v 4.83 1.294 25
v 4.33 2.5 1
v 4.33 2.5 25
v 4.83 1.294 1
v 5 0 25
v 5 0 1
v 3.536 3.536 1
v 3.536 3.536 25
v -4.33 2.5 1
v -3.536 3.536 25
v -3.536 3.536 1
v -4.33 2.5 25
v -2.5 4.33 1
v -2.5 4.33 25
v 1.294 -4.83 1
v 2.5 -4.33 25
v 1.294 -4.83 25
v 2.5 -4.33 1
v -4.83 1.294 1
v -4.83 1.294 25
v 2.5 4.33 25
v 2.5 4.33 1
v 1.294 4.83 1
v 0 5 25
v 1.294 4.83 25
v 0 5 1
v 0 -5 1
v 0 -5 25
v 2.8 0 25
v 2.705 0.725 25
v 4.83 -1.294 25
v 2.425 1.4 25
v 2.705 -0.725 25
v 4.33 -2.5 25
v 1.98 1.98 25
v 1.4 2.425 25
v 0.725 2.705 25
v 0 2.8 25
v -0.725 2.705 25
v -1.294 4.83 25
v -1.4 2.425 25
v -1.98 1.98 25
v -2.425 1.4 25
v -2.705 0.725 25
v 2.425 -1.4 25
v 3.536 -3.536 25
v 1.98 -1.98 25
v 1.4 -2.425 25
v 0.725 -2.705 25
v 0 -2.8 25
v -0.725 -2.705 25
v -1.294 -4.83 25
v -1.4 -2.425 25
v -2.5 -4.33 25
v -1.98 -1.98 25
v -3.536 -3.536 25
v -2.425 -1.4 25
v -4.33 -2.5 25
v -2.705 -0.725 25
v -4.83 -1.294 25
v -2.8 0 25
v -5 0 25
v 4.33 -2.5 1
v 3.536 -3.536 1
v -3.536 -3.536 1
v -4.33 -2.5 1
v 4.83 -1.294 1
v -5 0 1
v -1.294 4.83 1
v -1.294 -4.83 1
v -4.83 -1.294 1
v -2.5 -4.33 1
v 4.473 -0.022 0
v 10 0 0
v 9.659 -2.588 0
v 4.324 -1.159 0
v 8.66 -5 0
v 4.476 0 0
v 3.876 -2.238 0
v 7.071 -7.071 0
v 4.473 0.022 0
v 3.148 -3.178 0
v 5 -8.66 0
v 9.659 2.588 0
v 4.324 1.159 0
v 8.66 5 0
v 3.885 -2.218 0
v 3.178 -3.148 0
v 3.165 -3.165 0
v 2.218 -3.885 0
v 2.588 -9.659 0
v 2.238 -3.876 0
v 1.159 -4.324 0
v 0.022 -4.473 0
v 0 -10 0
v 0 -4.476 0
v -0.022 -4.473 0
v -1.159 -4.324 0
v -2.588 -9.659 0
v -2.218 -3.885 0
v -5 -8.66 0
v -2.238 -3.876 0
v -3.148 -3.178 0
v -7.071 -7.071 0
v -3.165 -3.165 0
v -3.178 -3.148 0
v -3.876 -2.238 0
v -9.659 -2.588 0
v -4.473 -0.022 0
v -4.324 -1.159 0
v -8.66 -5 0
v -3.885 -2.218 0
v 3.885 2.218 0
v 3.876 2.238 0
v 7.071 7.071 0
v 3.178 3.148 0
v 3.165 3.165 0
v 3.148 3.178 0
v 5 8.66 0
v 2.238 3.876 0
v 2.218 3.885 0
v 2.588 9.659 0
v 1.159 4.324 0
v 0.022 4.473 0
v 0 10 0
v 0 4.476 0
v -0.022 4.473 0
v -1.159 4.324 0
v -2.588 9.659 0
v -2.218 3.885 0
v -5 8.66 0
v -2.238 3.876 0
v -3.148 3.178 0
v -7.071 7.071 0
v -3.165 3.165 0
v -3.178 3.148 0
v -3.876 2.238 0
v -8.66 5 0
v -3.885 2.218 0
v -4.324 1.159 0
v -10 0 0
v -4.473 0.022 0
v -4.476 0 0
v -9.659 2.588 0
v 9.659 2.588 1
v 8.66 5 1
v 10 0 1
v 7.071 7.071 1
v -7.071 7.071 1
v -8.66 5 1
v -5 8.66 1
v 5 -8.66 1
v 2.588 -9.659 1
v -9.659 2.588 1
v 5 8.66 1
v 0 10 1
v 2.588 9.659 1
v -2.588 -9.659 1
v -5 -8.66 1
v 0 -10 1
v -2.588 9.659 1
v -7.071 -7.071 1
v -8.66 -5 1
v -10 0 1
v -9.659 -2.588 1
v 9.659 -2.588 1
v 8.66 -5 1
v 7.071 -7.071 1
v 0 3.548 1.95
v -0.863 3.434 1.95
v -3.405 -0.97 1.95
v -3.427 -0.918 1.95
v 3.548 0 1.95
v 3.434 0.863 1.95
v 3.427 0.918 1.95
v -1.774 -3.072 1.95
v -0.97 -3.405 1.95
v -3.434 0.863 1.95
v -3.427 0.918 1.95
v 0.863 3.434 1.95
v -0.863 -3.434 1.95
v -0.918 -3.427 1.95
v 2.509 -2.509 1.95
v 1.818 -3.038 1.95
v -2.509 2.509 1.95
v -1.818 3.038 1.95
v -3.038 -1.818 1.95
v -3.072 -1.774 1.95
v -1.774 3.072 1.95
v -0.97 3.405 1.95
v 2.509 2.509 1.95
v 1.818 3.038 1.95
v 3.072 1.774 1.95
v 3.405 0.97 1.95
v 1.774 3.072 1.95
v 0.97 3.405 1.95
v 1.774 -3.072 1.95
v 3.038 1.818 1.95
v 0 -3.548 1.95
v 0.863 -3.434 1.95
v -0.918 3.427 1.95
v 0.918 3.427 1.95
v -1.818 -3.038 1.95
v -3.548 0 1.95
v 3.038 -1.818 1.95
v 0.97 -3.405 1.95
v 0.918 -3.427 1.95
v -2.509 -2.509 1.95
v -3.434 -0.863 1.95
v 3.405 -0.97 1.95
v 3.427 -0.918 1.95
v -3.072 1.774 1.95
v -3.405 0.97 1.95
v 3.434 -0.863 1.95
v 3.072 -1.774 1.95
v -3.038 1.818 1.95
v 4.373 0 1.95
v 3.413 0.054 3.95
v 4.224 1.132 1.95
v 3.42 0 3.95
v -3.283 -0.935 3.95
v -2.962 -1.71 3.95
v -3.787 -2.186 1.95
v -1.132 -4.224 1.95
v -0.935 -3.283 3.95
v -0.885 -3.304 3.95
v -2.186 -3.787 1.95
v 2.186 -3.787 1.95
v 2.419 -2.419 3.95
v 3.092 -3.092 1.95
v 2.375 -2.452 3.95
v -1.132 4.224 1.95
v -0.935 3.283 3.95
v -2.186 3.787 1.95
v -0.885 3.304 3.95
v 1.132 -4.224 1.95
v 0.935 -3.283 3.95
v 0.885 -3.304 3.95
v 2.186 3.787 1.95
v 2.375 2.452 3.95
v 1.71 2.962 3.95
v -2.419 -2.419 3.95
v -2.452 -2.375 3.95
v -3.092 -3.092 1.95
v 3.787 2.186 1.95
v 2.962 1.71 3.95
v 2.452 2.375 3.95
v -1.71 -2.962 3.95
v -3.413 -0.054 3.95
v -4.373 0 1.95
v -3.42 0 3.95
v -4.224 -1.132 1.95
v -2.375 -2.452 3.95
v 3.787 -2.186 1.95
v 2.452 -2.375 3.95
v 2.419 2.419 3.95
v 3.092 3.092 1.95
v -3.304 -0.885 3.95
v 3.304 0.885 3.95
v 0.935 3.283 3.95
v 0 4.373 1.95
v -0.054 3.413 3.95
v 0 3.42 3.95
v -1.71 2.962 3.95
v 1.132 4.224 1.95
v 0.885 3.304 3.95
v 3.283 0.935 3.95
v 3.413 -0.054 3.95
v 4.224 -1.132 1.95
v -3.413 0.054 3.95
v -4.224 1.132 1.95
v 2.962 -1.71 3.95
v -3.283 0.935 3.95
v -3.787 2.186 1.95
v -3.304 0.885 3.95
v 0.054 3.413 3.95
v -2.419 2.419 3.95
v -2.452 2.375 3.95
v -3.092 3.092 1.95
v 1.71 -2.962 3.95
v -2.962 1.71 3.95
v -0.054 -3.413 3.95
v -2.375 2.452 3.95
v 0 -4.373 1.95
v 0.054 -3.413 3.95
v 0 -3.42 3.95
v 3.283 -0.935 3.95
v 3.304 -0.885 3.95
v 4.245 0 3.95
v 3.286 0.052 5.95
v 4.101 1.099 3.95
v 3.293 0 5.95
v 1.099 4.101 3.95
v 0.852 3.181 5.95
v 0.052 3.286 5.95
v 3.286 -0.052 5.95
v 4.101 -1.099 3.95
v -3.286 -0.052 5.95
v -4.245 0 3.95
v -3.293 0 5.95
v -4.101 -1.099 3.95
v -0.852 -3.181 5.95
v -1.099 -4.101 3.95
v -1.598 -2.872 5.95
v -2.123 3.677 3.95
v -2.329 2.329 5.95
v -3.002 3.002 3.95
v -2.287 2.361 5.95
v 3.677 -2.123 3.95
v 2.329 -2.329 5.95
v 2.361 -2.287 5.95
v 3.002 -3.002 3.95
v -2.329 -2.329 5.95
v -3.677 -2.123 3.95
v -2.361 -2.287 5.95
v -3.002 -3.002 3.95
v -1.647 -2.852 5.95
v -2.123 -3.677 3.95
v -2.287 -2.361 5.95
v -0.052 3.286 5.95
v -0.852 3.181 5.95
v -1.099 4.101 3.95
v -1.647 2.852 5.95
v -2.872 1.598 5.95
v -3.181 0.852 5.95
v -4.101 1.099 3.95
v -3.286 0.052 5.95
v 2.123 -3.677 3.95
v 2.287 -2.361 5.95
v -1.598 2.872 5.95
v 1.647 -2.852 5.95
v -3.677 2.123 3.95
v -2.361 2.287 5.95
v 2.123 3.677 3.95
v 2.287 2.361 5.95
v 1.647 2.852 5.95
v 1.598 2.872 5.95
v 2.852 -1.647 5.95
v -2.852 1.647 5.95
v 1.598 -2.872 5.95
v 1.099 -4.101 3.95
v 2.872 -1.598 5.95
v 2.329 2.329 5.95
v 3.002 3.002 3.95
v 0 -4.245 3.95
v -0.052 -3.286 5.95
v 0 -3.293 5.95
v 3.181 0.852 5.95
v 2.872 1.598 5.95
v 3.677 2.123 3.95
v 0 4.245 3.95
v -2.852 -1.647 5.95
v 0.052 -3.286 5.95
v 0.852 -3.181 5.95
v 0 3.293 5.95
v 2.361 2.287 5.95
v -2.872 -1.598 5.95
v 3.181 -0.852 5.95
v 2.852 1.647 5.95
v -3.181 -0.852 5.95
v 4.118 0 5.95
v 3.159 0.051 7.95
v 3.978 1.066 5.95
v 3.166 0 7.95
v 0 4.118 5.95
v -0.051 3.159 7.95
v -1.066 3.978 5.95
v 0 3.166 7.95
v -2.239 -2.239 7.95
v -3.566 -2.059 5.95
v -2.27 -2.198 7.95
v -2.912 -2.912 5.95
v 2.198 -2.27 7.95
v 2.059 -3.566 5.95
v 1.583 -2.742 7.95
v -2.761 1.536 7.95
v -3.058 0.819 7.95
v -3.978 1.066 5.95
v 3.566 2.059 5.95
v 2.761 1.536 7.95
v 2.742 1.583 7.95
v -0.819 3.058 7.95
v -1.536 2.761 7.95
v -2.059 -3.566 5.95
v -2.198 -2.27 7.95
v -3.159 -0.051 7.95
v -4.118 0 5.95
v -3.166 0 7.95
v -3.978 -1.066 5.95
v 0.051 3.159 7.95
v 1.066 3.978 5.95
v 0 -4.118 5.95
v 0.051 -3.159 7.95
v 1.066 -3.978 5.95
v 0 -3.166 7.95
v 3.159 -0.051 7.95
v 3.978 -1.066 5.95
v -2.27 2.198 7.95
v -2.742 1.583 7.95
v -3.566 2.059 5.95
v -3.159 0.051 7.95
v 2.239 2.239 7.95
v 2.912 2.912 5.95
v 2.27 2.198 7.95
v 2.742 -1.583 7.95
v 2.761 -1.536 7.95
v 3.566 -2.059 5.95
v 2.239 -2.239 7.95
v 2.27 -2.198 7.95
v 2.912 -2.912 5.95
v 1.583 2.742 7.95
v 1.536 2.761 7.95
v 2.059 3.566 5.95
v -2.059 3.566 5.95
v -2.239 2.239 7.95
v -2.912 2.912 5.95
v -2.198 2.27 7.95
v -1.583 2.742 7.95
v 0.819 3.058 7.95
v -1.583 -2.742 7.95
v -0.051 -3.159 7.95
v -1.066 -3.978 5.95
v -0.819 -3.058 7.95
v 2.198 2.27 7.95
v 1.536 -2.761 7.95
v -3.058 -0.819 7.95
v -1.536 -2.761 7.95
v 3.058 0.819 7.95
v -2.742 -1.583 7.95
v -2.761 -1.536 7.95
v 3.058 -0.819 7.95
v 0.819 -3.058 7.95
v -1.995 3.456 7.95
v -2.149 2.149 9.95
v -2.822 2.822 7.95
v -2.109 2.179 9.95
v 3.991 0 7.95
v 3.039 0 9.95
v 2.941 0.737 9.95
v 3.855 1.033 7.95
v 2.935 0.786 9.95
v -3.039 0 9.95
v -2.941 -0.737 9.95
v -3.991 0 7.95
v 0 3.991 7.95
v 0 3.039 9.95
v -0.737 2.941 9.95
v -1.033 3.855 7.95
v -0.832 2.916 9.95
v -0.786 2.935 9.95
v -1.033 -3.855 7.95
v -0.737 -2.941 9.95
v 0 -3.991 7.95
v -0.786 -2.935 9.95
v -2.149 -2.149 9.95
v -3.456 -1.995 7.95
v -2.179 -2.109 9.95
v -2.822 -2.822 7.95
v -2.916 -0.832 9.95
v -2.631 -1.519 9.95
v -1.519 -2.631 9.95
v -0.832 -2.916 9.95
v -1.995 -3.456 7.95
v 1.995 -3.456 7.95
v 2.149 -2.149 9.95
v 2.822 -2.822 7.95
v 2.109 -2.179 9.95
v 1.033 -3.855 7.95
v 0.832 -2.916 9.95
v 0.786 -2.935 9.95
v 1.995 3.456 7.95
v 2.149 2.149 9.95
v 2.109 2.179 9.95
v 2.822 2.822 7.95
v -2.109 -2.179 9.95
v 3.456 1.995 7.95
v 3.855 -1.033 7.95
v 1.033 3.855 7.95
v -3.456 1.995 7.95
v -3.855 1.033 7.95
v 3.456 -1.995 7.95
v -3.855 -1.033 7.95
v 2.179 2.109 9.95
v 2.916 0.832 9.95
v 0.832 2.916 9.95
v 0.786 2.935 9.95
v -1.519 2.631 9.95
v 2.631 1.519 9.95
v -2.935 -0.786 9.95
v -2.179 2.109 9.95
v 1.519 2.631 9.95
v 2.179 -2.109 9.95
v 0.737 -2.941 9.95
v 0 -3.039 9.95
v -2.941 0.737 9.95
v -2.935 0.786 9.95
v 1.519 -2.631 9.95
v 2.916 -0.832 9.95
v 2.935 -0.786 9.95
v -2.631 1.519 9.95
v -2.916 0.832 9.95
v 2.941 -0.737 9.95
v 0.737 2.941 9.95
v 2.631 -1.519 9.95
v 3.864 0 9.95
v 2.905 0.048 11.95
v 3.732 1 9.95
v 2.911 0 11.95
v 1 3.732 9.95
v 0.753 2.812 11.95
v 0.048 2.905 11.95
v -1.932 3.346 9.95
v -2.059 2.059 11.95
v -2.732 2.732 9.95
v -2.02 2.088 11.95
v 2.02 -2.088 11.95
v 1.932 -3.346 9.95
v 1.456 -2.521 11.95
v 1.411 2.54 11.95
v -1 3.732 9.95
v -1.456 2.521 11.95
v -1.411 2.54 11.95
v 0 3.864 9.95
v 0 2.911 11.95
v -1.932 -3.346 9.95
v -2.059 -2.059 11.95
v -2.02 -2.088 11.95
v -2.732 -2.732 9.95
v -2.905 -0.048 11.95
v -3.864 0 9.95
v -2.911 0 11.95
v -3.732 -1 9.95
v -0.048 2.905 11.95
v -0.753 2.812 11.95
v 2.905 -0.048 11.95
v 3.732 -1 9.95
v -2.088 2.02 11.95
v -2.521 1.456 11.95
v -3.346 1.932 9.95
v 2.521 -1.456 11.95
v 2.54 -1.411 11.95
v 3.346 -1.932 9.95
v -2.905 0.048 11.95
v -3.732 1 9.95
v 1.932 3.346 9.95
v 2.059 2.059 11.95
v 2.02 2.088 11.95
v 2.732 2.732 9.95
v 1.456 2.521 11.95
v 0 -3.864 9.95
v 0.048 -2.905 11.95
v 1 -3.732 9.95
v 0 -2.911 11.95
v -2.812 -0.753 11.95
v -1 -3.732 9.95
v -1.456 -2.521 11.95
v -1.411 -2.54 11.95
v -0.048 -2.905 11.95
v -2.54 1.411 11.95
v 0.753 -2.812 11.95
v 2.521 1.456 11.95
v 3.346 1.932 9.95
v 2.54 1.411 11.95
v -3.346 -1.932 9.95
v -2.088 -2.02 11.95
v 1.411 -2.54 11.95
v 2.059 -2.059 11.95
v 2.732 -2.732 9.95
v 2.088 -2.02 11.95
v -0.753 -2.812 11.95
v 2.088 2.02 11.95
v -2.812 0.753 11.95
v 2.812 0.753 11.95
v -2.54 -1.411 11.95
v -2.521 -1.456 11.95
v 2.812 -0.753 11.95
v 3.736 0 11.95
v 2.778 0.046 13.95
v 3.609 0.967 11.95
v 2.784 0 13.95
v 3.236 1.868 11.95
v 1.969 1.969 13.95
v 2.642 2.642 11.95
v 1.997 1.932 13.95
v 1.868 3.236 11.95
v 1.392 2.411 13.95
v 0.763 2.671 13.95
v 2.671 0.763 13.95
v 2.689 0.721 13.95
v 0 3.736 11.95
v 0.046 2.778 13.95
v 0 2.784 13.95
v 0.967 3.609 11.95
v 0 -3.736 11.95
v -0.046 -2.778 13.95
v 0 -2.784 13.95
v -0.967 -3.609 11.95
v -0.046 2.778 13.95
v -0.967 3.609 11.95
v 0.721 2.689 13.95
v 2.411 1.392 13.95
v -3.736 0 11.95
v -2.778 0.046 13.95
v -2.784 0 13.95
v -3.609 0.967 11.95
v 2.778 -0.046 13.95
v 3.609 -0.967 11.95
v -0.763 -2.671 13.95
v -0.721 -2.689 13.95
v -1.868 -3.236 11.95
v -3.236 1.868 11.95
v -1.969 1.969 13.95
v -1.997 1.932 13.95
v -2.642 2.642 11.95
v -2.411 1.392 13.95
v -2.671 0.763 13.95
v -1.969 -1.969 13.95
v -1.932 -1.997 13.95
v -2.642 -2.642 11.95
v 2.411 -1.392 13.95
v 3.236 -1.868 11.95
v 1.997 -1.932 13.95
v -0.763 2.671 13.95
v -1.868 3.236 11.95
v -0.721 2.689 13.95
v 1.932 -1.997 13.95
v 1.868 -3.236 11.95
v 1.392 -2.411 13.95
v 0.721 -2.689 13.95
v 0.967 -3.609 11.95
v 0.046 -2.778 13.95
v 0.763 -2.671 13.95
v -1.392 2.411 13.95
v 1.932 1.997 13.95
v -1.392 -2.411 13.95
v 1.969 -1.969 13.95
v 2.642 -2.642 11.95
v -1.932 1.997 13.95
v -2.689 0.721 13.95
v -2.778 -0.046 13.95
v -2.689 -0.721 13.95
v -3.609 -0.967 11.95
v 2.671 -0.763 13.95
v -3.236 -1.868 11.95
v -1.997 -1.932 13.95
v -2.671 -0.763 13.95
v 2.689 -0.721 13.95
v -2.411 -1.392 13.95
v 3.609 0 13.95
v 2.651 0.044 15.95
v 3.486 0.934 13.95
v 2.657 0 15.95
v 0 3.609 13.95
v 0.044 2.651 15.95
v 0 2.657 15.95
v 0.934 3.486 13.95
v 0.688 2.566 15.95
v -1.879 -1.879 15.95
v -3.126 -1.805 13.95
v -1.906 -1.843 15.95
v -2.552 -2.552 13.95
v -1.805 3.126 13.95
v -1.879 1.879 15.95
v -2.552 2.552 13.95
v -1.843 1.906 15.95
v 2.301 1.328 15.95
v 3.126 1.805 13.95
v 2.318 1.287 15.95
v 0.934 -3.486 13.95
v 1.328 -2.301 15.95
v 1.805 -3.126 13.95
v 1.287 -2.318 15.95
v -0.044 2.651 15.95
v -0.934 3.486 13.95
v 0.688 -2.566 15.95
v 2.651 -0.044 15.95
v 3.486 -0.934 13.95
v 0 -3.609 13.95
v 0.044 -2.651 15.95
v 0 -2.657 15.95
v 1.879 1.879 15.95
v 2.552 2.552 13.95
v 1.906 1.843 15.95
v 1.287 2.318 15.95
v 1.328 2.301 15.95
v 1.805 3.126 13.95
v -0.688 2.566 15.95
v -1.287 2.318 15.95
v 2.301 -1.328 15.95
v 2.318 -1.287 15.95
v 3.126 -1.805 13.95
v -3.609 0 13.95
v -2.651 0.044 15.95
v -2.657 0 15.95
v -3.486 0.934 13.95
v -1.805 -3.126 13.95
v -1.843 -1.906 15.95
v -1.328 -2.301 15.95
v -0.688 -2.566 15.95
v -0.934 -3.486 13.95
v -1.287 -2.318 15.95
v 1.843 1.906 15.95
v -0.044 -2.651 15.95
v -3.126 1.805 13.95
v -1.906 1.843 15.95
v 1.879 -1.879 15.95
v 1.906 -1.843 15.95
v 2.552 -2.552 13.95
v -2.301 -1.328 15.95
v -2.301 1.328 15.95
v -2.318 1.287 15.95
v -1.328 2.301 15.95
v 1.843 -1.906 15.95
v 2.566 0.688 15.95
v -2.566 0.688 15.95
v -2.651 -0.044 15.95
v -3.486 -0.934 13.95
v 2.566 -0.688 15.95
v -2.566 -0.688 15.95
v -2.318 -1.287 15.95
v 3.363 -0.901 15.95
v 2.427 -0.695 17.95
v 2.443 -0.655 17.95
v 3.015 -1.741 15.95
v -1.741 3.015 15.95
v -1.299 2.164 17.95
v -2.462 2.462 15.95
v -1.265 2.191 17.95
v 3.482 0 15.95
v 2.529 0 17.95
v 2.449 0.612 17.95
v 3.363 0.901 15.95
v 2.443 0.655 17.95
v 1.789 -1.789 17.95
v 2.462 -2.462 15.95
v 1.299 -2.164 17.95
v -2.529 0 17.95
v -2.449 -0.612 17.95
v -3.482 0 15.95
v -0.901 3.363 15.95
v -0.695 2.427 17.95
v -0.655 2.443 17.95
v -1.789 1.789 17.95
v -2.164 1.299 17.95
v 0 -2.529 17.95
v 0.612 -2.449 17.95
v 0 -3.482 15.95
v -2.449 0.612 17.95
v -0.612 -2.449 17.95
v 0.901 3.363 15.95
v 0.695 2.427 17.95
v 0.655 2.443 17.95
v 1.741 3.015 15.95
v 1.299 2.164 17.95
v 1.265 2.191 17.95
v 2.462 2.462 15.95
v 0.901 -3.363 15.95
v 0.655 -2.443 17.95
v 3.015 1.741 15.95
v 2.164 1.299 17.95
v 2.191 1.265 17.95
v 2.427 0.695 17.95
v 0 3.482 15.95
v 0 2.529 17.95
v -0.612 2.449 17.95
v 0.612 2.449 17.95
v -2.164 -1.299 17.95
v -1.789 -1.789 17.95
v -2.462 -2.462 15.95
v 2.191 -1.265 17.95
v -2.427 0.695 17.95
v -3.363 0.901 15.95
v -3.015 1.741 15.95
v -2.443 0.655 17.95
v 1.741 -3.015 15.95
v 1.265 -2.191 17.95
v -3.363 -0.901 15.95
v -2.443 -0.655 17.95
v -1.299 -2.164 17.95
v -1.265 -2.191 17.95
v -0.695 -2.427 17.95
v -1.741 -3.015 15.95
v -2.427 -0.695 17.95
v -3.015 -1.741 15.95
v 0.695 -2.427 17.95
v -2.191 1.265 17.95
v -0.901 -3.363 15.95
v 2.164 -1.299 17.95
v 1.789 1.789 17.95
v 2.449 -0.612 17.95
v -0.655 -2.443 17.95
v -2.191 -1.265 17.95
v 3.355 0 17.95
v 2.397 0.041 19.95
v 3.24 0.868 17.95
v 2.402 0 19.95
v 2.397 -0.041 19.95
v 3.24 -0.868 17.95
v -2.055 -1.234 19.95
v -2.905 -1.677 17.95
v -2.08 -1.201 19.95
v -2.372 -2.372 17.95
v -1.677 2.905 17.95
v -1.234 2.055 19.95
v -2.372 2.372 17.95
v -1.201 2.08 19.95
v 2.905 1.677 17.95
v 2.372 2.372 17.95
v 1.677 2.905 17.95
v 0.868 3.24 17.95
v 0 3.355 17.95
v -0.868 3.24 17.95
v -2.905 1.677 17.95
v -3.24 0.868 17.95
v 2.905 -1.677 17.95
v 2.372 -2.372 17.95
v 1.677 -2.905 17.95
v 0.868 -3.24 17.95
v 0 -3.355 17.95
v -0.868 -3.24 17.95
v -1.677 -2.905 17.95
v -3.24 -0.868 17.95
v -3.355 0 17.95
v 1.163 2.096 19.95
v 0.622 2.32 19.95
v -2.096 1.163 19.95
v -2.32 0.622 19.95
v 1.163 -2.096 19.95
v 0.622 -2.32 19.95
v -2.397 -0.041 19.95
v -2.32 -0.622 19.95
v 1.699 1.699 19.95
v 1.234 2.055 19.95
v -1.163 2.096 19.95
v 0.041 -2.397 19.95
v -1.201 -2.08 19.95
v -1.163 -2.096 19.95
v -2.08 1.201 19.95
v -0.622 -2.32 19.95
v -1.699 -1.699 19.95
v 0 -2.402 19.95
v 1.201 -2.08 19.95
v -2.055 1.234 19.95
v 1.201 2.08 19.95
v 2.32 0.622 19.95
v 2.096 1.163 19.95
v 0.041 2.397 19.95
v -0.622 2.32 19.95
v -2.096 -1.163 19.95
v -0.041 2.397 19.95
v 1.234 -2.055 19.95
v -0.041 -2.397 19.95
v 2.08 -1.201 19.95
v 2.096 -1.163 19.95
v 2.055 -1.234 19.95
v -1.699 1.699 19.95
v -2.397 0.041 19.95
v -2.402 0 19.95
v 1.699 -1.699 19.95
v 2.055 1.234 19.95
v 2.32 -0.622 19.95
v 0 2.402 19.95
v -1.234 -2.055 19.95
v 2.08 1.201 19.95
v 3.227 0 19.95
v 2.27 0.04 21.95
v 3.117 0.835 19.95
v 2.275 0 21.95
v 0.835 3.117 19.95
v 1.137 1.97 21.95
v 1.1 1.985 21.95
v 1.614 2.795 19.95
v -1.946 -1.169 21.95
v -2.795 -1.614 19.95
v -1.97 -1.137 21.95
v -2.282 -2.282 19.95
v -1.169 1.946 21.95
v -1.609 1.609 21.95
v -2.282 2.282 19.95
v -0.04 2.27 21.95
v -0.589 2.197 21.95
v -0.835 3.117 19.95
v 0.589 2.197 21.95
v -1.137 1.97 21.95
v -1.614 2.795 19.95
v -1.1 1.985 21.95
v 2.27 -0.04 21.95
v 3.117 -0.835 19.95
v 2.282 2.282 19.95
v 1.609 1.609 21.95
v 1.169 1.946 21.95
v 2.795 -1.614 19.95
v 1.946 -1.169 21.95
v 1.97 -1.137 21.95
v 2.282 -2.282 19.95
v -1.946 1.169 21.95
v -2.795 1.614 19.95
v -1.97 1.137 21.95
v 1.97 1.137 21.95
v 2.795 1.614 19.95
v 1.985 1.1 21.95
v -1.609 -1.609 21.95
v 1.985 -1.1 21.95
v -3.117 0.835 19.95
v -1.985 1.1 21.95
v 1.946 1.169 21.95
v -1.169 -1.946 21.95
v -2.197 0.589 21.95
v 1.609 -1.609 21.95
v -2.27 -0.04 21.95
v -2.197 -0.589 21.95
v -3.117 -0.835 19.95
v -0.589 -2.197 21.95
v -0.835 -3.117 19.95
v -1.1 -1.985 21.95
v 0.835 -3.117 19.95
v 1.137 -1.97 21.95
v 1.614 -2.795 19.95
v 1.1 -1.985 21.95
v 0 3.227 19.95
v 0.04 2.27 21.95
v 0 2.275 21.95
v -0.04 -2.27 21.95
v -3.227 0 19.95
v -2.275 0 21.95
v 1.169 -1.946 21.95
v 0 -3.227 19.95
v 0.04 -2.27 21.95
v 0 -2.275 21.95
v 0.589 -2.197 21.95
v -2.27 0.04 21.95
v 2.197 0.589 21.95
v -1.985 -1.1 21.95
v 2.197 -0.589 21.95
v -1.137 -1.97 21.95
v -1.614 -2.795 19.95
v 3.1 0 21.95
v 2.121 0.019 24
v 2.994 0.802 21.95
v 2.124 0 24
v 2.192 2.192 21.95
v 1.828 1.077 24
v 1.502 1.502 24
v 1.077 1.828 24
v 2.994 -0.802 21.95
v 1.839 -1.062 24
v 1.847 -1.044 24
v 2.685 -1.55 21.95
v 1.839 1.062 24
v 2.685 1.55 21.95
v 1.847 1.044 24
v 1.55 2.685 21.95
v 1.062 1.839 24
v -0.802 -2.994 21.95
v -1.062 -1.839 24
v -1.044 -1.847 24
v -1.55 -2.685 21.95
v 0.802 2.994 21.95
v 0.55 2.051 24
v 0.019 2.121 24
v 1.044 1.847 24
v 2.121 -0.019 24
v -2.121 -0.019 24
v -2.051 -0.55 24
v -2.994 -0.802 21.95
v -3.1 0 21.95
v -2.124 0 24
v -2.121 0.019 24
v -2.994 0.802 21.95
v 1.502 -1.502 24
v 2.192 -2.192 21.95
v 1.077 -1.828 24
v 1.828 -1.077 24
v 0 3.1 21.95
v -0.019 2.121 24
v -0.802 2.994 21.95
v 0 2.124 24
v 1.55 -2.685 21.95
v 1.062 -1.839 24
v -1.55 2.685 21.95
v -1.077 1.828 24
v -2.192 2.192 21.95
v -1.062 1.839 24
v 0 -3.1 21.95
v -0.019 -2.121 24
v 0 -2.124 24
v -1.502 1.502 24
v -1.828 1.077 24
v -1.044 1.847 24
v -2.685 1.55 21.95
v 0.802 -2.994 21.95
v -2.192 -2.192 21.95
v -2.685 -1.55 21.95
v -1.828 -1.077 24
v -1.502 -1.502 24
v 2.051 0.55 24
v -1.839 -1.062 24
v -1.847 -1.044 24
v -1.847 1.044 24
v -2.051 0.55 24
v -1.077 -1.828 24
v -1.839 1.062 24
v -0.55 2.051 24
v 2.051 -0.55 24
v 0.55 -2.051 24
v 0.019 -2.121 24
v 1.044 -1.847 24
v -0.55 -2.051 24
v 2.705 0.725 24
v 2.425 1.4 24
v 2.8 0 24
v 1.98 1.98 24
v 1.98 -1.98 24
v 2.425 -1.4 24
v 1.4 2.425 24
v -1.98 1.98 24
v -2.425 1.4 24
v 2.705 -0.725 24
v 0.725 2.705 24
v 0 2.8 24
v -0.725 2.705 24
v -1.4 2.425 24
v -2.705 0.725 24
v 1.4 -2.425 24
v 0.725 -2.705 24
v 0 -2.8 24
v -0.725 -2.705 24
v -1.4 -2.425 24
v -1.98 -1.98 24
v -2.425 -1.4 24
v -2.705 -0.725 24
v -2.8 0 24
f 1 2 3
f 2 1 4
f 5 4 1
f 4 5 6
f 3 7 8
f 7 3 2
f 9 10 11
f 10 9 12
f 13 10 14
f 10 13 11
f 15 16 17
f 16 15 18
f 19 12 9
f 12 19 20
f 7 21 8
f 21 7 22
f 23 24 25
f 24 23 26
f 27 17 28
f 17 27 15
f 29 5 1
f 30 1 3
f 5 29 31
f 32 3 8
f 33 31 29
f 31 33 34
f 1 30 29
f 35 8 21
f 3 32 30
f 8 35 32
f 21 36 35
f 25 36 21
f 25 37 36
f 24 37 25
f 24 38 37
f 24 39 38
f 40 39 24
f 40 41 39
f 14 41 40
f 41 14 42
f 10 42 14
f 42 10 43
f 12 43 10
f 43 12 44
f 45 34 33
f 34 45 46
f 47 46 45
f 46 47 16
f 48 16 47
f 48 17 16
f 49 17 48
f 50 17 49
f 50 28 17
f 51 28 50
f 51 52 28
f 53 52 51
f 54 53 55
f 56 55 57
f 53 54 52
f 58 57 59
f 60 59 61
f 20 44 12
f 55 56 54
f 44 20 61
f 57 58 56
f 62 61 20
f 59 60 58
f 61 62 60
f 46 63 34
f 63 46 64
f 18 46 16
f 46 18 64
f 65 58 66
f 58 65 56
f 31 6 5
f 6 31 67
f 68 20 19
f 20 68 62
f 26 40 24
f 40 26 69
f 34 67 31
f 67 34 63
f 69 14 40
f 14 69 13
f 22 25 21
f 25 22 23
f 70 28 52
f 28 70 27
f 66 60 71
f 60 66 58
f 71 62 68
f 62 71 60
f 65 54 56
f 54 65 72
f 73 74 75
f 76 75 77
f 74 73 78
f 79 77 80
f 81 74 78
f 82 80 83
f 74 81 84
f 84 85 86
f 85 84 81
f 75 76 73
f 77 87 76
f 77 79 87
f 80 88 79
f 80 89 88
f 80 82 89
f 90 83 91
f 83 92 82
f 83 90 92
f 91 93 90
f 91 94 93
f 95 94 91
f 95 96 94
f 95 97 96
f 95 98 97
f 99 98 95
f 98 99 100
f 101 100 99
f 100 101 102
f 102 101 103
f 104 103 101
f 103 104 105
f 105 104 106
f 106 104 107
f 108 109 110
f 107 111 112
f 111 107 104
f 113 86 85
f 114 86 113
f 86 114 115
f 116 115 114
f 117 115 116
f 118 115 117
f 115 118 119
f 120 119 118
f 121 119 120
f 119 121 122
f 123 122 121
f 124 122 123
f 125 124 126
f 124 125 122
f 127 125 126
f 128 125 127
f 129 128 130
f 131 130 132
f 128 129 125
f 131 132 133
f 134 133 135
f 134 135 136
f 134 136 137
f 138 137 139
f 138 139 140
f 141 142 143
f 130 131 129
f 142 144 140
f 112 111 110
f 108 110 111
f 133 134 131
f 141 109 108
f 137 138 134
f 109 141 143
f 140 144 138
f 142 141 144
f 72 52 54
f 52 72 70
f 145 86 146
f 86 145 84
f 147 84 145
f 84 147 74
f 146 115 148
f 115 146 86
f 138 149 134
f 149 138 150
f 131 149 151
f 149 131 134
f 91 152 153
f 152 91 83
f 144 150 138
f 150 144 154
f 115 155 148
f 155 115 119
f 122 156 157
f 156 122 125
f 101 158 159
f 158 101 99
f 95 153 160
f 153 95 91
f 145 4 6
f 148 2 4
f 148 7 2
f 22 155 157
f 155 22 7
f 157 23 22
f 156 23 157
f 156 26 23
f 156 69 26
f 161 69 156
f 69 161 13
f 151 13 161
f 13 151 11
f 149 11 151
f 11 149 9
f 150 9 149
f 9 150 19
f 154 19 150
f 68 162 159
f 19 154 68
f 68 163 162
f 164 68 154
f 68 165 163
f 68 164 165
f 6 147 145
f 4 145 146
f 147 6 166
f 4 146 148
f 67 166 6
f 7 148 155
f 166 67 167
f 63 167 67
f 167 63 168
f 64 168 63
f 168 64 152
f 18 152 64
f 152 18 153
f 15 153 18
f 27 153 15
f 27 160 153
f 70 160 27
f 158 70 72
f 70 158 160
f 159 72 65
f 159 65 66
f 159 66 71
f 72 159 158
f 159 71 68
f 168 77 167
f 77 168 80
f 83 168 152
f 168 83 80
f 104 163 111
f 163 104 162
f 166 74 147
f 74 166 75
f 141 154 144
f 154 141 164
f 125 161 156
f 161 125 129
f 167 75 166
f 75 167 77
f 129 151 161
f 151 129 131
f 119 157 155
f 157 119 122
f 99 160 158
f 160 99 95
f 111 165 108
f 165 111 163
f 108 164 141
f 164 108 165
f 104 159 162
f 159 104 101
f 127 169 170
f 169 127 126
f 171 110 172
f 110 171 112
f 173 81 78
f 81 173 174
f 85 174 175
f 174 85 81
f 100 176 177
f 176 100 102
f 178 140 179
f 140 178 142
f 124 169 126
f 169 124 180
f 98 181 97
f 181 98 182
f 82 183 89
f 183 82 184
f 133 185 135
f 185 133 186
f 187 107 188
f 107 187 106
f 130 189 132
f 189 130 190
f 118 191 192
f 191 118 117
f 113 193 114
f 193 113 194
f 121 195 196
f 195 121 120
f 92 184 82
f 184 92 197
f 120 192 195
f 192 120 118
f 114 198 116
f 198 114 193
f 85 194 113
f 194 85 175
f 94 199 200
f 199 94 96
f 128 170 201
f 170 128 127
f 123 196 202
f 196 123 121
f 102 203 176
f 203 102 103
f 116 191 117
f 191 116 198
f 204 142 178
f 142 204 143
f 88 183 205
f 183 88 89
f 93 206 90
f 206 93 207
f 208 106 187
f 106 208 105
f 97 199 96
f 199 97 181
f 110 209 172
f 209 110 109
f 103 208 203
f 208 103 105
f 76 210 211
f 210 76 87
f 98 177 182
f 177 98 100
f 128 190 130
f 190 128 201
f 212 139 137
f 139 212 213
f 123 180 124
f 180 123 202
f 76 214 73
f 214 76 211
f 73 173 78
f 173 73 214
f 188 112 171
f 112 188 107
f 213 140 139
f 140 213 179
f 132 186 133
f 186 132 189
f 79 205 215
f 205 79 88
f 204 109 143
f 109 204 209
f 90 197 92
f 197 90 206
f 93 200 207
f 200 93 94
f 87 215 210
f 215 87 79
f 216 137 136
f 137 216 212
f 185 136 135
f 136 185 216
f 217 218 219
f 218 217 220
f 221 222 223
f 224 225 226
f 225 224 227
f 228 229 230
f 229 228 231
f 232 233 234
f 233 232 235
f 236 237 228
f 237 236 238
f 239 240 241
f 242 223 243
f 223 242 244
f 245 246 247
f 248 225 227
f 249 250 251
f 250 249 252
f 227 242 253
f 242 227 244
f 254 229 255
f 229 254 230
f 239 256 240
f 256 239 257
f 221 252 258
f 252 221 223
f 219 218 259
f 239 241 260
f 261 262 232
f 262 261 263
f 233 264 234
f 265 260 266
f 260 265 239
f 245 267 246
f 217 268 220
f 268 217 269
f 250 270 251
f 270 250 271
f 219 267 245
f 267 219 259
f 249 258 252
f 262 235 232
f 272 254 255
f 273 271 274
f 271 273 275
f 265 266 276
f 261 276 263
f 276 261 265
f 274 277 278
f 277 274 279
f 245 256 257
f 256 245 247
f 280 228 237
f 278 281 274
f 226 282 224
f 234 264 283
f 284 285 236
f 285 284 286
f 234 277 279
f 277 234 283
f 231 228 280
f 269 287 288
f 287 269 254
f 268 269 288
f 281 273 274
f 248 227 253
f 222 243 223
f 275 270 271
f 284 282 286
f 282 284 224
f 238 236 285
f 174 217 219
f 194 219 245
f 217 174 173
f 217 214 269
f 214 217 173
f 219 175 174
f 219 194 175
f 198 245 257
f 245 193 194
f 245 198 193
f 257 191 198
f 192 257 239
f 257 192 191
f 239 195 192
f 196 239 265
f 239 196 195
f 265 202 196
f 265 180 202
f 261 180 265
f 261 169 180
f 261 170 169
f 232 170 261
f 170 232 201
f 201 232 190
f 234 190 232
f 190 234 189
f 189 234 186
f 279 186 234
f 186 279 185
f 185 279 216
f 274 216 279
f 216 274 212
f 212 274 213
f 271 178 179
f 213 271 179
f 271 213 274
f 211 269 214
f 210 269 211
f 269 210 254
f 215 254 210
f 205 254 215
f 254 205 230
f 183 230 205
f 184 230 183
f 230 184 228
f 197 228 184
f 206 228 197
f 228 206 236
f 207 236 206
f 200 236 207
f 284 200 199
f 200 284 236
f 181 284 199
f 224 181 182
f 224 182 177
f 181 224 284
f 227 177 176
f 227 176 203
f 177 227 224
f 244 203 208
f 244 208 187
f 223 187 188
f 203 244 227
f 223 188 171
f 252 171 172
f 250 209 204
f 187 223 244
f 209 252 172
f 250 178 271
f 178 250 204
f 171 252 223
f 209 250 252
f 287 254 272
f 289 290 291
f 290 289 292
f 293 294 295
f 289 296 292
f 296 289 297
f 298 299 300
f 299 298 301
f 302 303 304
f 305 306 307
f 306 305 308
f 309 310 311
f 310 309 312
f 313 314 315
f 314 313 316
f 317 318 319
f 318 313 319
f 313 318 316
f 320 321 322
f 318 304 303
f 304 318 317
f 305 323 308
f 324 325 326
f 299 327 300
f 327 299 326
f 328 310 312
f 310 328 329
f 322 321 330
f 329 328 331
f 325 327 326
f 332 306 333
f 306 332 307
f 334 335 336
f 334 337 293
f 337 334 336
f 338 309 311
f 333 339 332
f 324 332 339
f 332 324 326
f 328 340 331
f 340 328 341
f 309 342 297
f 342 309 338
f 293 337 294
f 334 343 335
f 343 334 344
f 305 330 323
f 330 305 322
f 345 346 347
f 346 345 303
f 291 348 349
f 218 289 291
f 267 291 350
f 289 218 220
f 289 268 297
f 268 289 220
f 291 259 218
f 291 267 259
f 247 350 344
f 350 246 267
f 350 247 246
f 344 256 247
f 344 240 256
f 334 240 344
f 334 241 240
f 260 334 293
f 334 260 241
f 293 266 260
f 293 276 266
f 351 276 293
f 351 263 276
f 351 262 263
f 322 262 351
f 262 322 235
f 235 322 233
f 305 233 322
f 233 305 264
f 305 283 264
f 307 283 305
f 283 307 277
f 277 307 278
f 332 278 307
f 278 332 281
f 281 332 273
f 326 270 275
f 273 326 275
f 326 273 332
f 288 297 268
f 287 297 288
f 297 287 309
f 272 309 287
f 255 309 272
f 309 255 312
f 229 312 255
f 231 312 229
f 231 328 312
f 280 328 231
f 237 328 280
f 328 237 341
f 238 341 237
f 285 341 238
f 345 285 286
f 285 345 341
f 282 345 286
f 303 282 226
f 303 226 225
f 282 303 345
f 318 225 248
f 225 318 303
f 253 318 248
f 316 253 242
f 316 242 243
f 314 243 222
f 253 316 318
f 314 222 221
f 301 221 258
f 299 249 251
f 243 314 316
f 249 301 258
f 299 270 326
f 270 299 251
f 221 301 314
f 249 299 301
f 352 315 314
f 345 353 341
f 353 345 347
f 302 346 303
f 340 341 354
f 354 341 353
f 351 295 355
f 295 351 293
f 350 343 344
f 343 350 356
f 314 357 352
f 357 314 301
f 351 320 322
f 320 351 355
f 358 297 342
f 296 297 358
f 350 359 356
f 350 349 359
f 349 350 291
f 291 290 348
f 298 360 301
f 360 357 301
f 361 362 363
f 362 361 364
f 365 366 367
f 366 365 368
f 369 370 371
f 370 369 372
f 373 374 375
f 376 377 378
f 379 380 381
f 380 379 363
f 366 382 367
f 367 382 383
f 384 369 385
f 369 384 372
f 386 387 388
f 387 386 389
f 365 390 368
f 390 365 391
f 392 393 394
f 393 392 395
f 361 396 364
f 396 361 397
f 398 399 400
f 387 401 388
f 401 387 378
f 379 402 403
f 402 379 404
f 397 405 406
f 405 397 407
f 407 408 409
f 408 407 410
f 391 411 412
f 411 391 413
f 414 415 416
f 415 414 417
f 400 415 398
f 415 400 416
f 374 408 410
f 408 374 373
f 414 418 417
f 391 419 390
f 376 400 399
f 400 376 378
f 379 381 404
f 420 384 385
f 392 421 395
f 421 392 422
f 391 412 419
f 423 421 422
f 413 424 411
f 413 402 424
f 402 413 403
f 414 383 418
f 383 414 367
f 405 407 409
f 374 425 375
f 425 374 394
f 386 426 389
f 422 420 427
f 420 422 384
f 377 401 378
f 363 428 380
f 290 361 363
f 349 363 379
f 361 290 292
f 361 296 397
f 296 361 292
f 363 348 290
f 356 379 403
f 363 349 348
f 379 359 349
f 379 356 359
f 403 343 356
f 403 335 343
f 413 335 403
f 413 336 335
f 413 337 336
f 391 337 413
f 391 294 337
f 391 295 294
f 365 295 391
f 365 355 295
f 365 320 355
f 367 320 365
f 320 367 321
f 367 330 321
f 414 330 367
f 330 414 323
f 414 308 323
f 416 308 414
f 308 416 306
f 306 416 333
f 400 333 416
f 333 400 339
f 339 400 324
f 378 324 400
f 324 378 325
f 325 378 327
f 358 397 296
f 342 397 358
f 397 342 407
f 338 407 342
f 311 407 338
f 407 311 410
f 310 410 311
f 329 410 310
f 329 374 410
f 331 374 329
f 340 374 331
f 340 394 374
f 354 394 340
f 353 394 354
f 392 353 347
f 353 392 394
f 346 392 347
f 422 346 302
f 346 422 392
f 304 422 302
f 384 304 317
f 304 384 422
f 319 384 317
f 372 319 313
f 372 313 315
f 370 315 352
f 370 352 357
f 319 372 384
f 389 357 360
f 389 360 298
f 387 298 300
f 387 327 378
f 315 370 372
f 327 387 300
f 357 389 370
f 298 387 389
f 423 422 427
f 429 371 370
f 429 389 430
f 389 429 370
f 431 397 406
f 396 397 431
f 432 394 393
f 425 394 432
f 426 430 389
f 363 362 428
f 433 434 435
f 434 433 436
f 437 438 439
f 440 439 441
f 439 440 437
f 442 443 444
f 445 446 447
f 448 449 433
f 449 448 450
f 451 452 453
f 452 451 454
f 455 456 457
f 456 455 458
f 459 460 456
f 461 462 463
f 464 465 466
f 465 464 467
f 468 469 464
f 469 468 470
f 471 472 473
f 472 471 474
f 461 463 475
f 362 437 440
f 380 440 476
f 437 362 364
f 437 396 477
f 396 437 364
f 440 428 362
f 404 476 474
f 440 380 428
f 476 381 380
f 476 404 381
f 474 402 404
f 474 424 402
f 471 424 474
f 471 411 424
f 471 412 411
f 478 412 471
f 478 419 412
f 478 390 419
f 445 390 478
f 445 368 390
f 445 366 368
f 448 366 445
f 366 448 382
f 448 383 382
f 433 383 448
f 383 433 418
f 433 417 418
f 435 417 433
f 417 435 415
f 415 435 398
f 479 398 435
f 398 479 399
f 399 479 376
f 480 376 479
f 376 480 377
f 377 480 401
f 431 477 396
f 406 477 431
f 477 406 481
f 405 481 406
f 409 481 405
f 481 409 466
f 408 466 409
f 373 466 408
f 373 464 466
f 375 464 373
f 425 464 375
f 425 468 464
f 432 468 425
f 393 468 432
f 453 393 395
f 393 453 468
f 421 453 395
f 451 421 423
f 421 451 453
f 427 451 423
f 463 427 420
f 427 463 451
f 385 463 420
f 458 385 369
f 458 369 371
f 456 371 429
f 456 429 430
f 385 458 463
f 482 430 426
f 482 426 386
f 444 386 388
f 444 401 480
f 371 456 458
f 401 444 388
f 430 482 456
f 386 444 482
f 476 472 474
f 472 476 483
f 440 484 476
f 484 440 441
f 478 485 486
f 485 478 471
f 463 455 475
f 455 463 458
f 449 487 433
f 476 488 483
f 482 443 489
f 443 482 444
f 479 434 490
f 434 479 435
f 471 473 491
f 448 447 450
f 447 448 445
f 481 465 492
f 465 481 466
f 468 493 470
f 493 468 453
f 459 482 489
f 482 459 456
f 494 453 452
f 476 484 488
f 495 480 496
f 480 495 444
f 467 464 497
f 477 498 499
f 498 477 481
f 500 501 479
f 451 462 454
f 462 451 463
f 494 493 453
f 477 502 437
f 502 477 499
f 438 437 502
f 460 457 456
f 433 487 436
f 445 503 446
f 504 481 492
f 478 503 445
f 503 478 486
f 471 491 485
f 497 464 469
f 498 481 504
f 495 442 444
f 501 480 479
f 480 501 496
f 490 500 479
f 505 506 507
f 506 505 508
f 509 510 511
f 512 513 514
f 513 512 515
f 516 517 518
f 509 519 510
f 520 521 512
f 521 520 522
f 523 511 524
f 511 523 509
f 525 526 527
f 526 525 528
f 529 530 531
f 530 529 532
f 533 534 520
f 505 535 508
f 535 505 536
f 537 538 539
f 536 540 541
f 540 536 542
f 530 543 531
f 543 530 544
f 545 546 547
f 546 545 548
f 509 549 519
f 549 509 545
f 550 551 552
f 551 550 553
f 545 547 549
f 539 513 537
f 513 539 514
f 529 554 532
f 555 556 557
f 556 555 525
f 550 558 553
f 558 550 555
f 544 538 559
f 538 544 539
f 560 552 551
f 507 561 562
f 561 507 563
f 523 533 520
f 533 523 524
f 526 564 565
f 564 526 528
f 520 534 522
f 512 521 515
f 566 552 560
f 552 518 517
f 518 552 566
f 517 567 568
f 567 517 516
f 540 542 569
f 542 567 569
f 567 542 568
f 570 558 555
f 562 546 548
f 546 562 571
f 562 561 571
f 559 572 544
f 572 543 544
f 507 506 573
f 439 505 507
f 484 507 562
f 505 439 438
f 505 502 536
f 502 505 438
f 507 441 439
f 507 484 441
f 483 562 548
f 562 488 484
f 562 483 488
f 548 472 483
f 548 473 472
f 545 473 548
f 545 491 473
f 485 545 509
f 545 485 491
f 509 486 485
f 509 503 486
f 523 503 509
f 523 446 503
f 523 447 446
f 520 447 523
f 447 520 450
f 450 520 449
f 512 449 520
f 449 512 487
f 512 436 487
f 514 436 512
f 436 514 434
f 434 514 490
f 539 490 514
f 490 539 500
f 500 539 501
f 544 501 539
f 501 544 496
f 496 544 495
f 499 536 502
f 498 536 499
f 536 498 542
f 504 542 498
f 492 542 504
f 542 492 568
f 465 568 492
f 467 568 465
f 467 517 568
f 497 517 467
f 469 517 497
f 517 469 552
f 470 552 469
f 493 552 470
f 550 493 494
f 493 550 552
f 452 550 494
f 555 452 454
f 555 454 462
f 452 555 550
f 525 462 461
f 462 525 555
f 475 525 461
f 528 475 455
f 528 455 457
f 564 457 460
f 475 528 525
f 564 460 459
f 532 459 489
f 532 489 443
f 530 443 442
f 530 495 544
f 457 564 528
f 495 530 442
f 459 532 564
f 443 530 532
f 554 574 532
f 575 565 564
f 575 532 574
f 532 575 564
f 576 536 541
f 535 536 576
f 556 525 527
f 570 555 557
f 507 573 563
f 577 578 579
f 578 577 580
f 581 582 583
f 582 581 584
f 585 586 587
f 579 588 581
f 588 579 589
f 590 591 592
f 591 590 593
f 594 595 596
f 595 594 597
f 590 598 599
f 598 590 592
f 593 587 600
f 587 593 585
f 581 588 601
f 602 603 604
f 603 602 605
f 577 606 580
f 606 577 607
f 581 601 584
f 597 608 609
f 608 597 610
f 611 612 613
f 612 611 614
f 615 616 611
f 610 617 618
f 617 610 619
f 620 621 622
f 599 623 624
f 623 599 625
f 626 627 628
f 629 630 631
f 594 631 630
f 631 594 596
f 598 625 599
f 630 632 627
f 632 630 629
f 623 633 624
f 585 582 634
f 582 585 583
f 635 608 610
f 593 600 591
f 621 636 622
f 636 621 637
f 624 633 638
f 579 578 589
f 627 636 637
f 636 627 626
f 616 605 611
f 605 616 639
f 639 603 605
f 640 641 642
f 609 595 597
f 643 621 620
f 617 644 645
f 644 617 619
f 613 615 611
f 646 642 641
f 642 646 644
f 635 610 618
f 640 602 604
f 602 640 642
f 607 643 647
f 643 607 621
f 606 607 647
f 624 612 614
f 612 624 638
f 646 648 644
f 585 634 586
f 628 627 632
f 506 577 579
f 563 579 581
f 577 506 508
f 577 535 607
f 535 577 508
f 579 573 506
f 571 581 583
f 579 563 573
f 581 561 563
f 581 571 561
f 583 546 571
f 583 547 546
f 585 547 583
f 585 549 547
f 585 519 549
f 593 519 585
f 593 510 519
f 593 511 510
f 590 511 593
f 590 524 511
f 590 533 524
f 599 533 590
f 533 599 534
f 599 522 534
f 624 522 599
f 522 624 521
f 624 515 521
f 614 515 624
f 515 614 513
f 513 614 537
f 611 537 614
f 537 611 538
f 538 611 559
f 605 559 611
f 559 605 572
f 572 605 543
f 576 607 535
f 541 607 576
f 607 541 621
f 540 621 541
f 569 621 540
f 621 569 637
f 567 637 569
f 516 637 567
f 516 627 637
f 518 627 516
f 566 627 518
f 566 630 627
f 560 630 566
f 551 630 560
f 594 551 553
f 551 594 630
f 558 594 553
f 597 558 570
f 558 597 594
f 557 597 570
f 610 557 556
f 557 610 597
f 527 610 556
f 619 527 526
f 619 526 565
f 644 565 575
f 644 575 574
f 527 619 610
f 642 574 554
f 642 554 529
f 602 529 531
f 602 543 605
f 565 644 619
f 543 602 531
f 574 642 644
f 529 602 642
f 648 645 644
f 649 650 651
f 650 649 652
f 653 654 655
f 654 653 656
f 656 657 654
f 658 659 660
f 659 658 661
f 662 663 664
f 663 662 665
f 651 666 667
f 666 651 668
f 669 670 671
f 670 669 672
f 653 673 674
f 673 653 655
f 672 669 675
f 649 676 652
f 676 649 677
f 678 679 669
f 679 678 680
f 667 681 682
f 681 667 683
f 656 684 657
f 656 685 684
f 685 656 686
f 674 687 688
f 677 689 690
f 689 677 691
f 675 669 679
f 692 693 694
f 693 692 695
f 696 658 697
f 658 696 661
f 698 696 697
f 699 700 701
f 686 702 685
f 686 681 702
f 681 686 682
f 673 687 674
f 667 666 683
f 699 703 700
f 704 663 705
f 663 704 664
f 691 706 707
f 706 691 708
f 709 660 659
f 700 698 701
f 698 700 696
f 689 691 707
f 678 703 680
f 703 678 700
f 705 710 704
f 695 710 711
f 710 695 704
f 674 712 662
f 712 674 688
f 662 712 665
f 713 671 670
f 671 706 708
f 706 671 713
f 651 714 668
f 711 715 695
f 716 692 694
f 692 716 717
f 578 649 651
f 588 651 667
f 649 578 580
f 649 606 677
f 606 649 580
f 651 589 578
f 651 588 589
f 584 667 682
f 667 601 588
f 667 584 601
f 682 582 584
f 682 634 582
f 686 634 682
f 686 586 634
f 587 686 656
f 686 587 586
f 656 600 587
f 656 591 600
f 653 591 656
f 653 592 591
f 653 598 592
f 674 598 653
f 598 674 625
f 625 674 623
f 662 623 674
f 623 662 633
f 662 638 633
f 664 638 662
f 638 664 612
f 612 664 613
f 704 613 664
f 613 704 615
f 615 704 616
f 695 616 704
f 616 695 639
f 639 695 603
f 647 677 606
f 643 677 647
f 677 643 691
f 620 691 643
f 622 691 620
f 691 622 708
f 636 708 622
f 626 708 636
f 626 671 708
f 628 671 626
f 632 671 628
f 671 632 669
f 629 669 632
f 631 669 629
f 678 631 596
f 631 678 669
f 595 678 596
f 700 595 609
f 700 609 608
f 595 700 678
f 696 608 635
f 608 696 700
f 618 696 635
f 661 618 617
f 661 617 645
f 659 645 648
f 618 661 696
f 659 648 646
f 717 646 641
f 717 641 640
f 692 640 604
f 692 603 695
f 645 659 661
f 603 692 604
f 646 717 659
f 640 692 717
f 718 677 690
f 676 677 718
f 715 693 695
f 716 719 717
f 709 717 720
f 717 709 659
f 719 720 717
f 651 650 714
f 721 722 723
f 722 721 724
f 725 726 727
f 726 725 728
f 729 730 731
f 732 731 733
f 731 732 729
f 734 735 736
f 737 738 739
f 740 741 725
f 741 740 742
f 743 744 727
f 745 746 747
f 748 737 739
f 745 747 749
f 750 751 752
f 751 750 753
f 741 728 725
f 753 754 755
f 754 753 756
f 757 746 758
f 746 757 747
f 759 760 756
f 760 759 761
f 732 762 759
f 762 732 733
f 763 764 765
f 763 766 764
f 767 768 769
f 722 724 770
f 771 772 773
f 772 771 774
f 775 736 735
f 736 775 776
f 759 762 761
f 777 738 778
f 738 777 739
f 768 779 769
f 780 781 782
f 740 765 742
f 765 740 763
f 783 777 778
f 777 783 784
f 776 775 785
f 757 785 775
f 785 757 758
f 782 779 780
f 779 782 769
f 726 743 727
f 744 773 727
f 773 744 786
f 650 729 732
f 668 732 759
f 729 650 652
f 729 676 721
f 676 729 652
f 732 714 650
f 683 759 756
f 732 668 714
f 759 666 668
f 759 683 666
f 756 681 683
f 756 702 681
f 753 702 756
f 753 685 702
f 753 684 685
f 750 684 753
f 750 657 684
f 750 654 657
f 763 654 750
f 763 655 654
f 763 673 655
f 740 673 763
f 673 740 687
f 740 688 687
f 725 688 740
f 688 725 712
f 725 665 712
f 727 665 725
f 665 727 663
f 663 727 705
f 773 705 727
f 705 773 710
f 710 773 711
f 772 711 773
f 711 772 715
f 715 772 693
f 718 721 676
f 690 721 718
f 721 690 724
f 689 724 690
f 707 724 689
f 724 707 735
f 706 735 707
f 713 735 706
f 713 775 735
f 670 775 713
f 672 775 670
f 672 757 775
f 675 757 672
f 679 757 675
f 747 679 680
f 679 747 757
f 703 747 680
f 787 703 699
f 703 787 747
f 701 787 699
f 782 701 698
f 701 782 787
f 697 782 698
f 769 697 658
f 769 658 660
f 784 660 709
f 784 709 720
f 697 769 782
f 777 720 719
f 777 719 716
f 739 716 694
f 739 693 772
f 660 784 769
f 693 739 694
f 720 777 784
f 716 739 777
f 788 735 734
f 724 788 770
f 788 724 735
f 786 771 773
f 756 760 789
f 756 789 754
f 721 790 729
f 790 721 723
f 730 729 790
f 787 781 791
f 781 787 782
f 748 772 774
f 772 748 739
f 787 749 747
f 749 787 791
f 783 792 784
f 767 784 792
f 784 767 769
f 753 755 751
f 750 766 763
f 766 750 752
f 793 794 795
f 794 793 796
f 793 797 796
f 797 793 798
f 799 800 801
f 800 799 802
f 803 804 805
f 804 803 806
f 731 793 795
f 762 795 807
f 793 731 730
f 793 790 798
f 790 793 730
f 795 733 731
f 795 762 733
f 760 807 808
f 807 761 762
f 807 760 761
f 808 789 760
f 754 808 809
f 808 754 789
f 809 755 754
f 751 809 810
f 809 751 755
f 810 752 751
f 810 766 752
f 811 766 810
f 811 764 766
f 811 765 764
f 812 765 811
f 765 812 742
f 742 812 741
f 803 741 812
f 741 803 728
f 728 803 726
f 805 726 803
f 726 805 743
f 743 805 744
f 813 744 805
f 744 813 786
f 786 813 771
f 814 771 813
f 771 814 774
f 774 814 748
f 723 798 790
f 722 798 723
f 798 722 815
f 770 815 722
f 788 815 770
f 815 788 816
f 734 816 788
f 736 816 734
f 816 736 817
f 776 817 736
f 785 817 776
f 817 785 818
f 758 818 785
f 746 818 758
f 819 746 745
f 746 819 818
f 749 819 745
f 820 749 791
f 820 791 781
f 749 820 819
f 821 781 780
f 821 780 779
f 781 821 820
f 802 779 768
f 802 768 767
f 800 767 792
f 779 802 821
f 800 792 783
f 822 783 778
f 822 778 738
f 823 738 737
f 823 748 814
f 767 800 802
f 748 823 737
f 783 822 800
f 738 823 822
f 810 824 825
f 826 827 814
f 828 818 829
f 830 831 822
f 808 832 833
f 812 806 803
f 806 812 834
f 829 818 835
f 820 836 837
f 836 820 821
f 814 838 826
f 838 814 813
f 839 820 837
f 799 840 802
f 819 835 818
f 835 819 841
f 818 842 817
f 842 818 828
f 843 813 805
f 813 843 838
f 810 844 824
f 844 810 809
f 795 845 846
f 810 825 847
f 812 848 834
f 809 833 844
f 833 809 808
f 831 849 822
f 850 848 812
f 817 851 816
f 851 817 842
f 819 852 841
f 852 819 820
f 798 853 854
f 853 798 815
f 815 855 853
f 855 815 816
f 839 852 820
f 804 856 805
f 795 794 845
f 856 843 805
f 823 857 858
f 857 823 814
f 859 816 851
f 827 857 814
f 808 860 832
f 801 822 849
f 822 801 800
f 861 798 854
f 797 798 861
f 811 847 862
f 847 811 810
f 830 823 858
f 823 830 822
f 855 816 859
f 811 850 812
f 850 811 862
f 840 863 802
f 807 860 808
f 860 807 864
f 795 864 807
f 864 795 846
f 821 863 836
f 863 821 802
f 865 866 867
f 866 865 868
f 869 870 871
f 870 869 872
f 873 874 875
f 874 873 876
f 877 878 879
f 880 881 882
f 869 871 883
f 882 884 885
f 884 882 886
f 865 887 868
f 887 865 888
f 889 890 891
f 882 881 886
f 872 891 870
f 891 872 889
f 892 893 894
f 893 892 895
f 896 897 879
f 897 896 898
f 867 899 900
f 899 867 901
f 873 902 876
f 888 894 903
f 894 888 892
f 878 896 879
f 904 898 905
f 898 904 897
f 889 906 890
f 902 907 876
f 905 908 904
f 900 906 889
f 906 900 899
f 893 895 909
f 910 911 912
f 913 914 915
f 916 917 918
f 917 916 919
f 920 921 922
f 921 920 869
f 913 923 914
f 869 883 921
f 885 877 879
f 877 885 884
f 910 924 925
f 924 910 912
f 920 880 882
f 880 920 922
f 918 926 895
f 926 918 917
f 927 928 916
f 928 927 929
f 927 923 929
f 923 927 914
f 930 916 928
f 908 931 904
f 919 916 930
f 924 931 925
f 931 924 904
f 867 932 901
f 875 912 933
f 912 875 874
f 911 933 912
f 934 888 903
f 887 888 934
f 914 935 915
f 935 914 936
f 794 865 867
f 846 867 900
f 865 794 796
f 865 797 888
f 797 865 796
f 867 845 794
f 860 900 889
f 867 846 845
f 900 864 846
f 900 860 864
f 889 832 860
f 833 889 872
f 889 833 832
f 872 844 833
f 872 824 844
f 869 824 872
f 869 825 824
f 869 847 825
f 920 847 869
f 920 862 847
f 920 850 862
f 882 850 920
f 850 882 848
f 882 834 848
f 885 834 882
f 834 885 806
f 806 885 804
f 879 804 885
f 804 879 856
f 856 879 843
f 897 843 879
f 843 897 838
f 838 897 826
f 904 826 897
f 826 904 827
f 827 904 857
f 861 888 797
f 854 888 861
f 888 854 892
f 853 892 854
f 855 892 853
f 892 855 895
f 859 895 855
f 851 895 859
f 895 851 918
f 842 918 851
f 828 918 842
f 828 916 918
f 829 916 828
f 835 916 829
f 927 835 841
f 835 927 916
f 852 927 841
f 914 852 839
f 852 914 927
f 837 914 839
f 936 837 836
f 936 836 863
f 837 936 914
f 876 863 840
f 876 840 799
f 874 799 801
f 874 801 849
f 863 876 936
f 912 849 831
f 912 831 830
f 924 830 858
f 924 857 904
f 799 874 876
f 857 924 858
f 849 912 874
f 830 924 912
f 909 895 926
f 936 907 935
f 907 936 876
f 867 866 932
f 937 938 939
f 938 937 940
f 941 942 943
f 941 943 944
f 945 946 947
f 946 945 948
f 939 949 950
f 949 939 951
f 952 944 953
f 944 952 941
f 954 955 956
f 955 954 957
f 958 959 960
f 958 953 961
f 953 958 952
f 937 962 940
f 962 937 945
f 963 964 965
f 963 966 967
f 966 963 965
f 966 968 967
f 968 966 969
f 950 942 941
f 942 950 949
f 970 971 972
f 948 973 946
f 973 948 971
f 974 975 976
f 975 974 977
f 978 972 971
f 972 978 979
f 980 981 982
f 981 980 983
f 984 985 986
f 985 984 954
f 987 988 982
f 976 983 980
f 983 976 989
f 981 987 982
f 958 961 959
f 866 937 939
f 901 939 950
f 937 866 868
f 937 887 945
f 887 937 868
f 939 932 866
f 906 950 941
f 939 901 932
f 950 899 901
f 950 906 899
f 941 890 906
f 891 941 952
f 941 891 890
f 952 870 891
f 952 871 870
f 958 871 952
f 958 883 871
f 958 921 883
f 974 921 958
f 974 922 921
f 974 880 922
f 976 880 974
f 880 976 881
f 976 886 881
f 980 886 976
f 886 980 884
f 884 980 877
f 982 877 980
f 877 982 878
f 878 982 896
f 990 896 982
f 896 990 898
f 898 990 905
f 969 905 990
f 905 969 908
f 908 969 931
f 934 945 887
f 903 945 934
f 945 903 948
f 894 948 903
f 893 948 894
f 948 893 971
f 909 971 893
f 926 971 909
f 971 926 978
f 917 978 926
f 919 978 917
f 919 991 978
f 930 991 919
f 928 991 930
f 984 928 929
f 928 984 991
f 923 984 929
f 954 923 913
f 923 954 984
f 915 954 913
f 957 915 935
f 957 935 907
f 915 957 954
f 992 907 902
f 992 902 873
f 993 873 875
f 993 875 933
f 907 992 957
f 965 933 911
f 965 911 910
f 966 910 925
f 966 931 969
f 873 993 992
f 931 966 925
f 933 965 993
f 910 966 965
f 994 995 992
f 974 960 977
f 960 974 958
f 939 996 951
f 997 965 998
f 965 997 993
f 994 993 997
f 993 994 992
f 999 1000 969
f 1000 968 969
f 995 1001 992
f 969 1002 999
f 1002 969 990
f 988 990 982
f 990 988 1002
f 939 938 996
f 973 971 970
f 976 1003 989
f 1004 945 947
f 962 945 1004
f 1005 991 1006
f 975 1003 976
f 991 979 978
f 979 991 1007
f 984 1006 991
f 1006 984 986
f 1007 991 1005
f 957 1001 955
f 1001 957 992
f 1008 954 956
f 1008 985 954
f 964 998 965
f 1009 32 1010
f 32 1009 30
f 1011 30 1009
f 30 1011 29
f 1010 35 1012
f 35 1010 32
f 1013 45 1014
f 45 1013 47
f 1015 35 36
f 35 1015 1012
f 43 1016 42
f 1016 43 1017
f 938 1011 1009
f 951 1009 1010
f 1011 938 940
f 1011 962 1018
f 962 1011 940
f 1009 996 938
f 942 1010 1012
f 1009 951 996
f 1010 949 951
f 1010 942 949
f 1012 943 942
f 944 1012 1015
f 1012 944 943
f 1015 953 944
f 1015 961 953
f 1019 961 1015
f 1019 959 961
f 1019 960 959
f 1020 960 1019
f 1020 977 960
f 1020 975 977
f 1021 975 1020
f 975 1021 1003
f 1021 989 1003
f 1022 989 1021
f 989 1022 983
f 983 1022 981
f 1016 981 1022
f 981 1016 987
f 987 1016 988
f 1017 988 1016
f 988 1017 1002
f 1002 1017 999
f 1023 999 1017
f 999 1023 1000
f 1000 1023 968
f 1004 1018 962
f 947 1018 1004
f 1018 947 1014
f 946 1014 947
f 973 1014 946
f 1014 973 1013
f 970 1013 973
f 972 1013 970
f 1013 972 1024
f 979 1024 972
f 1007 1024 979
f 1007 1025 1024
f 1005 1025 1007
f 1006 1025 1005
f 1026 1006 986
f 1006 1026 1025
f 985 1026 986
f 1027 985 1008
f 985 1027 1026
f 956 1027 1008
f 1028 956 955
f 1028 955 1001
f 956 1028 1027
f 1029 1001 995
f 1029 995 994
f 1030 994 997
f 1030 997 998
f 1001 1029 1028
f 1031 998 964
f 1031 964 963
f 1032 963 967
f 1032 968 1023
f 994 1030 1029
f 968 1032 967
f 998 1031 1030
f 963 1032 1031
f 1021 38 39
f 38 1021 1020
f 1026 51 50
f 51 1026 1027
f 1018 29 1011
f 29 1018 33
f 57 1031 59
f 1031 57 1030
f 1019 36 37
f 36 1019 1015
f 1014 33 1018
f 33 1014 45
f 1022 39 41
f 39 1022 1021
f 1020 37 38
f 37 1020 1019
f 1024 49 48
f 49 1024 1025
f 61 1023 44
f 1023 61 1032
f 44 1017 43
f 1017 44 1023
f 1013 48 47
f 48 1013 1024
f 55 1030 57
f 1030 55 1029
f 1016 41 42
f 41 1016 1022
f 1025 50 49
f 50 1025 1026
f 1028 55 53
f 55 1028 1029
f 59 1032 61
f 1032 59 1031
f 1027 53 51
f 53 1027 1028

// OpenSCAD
$fn=24;
h=25;
outer_r=5; //radius of tube
inner_r=4.5; //inner radius of bottom of tube
baffle_r=10;//baffle to stop external light hitting the sensor
baffle_h=1;
lens_outer_r=5/2+0.3; //outer radius of lens
lens_aperture_r=3.8/2+0.2; //clear aperture of lens
lens_t=1.0; //thickness of lens

n_cones=floor((h-lens_t)/2); //how many ridges to make
cone_h=(h-lens_t)/n_cones; //height of each ridge
cone_dr=cone_h/2; //change in radius over each cone

d=0.05;

difference(){
	union(){
		cylinder(r=outer_r, h=h); //tube
		cylinder(r=baffle_r, h=baffle_h); //baffle
	}

	translate([0, 0, h-1.0]) cylinder(r=5.6/2, h=999); //lens

	//clearance for beam, with light-trapping edges
	for(i = [0 : n_cones - 1]) assign(p = i/(n_cones - 1))
		translate([0, 0, i * cone_h - d]) 
			cylinder(r1=(1-p)*inner_r + p*(lens_aperture_r + cone_dr),
						r2=(1-p)*(inner_r - cone_dr) + p*lens_aperture_r,
						h=cone_h+2*d);
}
